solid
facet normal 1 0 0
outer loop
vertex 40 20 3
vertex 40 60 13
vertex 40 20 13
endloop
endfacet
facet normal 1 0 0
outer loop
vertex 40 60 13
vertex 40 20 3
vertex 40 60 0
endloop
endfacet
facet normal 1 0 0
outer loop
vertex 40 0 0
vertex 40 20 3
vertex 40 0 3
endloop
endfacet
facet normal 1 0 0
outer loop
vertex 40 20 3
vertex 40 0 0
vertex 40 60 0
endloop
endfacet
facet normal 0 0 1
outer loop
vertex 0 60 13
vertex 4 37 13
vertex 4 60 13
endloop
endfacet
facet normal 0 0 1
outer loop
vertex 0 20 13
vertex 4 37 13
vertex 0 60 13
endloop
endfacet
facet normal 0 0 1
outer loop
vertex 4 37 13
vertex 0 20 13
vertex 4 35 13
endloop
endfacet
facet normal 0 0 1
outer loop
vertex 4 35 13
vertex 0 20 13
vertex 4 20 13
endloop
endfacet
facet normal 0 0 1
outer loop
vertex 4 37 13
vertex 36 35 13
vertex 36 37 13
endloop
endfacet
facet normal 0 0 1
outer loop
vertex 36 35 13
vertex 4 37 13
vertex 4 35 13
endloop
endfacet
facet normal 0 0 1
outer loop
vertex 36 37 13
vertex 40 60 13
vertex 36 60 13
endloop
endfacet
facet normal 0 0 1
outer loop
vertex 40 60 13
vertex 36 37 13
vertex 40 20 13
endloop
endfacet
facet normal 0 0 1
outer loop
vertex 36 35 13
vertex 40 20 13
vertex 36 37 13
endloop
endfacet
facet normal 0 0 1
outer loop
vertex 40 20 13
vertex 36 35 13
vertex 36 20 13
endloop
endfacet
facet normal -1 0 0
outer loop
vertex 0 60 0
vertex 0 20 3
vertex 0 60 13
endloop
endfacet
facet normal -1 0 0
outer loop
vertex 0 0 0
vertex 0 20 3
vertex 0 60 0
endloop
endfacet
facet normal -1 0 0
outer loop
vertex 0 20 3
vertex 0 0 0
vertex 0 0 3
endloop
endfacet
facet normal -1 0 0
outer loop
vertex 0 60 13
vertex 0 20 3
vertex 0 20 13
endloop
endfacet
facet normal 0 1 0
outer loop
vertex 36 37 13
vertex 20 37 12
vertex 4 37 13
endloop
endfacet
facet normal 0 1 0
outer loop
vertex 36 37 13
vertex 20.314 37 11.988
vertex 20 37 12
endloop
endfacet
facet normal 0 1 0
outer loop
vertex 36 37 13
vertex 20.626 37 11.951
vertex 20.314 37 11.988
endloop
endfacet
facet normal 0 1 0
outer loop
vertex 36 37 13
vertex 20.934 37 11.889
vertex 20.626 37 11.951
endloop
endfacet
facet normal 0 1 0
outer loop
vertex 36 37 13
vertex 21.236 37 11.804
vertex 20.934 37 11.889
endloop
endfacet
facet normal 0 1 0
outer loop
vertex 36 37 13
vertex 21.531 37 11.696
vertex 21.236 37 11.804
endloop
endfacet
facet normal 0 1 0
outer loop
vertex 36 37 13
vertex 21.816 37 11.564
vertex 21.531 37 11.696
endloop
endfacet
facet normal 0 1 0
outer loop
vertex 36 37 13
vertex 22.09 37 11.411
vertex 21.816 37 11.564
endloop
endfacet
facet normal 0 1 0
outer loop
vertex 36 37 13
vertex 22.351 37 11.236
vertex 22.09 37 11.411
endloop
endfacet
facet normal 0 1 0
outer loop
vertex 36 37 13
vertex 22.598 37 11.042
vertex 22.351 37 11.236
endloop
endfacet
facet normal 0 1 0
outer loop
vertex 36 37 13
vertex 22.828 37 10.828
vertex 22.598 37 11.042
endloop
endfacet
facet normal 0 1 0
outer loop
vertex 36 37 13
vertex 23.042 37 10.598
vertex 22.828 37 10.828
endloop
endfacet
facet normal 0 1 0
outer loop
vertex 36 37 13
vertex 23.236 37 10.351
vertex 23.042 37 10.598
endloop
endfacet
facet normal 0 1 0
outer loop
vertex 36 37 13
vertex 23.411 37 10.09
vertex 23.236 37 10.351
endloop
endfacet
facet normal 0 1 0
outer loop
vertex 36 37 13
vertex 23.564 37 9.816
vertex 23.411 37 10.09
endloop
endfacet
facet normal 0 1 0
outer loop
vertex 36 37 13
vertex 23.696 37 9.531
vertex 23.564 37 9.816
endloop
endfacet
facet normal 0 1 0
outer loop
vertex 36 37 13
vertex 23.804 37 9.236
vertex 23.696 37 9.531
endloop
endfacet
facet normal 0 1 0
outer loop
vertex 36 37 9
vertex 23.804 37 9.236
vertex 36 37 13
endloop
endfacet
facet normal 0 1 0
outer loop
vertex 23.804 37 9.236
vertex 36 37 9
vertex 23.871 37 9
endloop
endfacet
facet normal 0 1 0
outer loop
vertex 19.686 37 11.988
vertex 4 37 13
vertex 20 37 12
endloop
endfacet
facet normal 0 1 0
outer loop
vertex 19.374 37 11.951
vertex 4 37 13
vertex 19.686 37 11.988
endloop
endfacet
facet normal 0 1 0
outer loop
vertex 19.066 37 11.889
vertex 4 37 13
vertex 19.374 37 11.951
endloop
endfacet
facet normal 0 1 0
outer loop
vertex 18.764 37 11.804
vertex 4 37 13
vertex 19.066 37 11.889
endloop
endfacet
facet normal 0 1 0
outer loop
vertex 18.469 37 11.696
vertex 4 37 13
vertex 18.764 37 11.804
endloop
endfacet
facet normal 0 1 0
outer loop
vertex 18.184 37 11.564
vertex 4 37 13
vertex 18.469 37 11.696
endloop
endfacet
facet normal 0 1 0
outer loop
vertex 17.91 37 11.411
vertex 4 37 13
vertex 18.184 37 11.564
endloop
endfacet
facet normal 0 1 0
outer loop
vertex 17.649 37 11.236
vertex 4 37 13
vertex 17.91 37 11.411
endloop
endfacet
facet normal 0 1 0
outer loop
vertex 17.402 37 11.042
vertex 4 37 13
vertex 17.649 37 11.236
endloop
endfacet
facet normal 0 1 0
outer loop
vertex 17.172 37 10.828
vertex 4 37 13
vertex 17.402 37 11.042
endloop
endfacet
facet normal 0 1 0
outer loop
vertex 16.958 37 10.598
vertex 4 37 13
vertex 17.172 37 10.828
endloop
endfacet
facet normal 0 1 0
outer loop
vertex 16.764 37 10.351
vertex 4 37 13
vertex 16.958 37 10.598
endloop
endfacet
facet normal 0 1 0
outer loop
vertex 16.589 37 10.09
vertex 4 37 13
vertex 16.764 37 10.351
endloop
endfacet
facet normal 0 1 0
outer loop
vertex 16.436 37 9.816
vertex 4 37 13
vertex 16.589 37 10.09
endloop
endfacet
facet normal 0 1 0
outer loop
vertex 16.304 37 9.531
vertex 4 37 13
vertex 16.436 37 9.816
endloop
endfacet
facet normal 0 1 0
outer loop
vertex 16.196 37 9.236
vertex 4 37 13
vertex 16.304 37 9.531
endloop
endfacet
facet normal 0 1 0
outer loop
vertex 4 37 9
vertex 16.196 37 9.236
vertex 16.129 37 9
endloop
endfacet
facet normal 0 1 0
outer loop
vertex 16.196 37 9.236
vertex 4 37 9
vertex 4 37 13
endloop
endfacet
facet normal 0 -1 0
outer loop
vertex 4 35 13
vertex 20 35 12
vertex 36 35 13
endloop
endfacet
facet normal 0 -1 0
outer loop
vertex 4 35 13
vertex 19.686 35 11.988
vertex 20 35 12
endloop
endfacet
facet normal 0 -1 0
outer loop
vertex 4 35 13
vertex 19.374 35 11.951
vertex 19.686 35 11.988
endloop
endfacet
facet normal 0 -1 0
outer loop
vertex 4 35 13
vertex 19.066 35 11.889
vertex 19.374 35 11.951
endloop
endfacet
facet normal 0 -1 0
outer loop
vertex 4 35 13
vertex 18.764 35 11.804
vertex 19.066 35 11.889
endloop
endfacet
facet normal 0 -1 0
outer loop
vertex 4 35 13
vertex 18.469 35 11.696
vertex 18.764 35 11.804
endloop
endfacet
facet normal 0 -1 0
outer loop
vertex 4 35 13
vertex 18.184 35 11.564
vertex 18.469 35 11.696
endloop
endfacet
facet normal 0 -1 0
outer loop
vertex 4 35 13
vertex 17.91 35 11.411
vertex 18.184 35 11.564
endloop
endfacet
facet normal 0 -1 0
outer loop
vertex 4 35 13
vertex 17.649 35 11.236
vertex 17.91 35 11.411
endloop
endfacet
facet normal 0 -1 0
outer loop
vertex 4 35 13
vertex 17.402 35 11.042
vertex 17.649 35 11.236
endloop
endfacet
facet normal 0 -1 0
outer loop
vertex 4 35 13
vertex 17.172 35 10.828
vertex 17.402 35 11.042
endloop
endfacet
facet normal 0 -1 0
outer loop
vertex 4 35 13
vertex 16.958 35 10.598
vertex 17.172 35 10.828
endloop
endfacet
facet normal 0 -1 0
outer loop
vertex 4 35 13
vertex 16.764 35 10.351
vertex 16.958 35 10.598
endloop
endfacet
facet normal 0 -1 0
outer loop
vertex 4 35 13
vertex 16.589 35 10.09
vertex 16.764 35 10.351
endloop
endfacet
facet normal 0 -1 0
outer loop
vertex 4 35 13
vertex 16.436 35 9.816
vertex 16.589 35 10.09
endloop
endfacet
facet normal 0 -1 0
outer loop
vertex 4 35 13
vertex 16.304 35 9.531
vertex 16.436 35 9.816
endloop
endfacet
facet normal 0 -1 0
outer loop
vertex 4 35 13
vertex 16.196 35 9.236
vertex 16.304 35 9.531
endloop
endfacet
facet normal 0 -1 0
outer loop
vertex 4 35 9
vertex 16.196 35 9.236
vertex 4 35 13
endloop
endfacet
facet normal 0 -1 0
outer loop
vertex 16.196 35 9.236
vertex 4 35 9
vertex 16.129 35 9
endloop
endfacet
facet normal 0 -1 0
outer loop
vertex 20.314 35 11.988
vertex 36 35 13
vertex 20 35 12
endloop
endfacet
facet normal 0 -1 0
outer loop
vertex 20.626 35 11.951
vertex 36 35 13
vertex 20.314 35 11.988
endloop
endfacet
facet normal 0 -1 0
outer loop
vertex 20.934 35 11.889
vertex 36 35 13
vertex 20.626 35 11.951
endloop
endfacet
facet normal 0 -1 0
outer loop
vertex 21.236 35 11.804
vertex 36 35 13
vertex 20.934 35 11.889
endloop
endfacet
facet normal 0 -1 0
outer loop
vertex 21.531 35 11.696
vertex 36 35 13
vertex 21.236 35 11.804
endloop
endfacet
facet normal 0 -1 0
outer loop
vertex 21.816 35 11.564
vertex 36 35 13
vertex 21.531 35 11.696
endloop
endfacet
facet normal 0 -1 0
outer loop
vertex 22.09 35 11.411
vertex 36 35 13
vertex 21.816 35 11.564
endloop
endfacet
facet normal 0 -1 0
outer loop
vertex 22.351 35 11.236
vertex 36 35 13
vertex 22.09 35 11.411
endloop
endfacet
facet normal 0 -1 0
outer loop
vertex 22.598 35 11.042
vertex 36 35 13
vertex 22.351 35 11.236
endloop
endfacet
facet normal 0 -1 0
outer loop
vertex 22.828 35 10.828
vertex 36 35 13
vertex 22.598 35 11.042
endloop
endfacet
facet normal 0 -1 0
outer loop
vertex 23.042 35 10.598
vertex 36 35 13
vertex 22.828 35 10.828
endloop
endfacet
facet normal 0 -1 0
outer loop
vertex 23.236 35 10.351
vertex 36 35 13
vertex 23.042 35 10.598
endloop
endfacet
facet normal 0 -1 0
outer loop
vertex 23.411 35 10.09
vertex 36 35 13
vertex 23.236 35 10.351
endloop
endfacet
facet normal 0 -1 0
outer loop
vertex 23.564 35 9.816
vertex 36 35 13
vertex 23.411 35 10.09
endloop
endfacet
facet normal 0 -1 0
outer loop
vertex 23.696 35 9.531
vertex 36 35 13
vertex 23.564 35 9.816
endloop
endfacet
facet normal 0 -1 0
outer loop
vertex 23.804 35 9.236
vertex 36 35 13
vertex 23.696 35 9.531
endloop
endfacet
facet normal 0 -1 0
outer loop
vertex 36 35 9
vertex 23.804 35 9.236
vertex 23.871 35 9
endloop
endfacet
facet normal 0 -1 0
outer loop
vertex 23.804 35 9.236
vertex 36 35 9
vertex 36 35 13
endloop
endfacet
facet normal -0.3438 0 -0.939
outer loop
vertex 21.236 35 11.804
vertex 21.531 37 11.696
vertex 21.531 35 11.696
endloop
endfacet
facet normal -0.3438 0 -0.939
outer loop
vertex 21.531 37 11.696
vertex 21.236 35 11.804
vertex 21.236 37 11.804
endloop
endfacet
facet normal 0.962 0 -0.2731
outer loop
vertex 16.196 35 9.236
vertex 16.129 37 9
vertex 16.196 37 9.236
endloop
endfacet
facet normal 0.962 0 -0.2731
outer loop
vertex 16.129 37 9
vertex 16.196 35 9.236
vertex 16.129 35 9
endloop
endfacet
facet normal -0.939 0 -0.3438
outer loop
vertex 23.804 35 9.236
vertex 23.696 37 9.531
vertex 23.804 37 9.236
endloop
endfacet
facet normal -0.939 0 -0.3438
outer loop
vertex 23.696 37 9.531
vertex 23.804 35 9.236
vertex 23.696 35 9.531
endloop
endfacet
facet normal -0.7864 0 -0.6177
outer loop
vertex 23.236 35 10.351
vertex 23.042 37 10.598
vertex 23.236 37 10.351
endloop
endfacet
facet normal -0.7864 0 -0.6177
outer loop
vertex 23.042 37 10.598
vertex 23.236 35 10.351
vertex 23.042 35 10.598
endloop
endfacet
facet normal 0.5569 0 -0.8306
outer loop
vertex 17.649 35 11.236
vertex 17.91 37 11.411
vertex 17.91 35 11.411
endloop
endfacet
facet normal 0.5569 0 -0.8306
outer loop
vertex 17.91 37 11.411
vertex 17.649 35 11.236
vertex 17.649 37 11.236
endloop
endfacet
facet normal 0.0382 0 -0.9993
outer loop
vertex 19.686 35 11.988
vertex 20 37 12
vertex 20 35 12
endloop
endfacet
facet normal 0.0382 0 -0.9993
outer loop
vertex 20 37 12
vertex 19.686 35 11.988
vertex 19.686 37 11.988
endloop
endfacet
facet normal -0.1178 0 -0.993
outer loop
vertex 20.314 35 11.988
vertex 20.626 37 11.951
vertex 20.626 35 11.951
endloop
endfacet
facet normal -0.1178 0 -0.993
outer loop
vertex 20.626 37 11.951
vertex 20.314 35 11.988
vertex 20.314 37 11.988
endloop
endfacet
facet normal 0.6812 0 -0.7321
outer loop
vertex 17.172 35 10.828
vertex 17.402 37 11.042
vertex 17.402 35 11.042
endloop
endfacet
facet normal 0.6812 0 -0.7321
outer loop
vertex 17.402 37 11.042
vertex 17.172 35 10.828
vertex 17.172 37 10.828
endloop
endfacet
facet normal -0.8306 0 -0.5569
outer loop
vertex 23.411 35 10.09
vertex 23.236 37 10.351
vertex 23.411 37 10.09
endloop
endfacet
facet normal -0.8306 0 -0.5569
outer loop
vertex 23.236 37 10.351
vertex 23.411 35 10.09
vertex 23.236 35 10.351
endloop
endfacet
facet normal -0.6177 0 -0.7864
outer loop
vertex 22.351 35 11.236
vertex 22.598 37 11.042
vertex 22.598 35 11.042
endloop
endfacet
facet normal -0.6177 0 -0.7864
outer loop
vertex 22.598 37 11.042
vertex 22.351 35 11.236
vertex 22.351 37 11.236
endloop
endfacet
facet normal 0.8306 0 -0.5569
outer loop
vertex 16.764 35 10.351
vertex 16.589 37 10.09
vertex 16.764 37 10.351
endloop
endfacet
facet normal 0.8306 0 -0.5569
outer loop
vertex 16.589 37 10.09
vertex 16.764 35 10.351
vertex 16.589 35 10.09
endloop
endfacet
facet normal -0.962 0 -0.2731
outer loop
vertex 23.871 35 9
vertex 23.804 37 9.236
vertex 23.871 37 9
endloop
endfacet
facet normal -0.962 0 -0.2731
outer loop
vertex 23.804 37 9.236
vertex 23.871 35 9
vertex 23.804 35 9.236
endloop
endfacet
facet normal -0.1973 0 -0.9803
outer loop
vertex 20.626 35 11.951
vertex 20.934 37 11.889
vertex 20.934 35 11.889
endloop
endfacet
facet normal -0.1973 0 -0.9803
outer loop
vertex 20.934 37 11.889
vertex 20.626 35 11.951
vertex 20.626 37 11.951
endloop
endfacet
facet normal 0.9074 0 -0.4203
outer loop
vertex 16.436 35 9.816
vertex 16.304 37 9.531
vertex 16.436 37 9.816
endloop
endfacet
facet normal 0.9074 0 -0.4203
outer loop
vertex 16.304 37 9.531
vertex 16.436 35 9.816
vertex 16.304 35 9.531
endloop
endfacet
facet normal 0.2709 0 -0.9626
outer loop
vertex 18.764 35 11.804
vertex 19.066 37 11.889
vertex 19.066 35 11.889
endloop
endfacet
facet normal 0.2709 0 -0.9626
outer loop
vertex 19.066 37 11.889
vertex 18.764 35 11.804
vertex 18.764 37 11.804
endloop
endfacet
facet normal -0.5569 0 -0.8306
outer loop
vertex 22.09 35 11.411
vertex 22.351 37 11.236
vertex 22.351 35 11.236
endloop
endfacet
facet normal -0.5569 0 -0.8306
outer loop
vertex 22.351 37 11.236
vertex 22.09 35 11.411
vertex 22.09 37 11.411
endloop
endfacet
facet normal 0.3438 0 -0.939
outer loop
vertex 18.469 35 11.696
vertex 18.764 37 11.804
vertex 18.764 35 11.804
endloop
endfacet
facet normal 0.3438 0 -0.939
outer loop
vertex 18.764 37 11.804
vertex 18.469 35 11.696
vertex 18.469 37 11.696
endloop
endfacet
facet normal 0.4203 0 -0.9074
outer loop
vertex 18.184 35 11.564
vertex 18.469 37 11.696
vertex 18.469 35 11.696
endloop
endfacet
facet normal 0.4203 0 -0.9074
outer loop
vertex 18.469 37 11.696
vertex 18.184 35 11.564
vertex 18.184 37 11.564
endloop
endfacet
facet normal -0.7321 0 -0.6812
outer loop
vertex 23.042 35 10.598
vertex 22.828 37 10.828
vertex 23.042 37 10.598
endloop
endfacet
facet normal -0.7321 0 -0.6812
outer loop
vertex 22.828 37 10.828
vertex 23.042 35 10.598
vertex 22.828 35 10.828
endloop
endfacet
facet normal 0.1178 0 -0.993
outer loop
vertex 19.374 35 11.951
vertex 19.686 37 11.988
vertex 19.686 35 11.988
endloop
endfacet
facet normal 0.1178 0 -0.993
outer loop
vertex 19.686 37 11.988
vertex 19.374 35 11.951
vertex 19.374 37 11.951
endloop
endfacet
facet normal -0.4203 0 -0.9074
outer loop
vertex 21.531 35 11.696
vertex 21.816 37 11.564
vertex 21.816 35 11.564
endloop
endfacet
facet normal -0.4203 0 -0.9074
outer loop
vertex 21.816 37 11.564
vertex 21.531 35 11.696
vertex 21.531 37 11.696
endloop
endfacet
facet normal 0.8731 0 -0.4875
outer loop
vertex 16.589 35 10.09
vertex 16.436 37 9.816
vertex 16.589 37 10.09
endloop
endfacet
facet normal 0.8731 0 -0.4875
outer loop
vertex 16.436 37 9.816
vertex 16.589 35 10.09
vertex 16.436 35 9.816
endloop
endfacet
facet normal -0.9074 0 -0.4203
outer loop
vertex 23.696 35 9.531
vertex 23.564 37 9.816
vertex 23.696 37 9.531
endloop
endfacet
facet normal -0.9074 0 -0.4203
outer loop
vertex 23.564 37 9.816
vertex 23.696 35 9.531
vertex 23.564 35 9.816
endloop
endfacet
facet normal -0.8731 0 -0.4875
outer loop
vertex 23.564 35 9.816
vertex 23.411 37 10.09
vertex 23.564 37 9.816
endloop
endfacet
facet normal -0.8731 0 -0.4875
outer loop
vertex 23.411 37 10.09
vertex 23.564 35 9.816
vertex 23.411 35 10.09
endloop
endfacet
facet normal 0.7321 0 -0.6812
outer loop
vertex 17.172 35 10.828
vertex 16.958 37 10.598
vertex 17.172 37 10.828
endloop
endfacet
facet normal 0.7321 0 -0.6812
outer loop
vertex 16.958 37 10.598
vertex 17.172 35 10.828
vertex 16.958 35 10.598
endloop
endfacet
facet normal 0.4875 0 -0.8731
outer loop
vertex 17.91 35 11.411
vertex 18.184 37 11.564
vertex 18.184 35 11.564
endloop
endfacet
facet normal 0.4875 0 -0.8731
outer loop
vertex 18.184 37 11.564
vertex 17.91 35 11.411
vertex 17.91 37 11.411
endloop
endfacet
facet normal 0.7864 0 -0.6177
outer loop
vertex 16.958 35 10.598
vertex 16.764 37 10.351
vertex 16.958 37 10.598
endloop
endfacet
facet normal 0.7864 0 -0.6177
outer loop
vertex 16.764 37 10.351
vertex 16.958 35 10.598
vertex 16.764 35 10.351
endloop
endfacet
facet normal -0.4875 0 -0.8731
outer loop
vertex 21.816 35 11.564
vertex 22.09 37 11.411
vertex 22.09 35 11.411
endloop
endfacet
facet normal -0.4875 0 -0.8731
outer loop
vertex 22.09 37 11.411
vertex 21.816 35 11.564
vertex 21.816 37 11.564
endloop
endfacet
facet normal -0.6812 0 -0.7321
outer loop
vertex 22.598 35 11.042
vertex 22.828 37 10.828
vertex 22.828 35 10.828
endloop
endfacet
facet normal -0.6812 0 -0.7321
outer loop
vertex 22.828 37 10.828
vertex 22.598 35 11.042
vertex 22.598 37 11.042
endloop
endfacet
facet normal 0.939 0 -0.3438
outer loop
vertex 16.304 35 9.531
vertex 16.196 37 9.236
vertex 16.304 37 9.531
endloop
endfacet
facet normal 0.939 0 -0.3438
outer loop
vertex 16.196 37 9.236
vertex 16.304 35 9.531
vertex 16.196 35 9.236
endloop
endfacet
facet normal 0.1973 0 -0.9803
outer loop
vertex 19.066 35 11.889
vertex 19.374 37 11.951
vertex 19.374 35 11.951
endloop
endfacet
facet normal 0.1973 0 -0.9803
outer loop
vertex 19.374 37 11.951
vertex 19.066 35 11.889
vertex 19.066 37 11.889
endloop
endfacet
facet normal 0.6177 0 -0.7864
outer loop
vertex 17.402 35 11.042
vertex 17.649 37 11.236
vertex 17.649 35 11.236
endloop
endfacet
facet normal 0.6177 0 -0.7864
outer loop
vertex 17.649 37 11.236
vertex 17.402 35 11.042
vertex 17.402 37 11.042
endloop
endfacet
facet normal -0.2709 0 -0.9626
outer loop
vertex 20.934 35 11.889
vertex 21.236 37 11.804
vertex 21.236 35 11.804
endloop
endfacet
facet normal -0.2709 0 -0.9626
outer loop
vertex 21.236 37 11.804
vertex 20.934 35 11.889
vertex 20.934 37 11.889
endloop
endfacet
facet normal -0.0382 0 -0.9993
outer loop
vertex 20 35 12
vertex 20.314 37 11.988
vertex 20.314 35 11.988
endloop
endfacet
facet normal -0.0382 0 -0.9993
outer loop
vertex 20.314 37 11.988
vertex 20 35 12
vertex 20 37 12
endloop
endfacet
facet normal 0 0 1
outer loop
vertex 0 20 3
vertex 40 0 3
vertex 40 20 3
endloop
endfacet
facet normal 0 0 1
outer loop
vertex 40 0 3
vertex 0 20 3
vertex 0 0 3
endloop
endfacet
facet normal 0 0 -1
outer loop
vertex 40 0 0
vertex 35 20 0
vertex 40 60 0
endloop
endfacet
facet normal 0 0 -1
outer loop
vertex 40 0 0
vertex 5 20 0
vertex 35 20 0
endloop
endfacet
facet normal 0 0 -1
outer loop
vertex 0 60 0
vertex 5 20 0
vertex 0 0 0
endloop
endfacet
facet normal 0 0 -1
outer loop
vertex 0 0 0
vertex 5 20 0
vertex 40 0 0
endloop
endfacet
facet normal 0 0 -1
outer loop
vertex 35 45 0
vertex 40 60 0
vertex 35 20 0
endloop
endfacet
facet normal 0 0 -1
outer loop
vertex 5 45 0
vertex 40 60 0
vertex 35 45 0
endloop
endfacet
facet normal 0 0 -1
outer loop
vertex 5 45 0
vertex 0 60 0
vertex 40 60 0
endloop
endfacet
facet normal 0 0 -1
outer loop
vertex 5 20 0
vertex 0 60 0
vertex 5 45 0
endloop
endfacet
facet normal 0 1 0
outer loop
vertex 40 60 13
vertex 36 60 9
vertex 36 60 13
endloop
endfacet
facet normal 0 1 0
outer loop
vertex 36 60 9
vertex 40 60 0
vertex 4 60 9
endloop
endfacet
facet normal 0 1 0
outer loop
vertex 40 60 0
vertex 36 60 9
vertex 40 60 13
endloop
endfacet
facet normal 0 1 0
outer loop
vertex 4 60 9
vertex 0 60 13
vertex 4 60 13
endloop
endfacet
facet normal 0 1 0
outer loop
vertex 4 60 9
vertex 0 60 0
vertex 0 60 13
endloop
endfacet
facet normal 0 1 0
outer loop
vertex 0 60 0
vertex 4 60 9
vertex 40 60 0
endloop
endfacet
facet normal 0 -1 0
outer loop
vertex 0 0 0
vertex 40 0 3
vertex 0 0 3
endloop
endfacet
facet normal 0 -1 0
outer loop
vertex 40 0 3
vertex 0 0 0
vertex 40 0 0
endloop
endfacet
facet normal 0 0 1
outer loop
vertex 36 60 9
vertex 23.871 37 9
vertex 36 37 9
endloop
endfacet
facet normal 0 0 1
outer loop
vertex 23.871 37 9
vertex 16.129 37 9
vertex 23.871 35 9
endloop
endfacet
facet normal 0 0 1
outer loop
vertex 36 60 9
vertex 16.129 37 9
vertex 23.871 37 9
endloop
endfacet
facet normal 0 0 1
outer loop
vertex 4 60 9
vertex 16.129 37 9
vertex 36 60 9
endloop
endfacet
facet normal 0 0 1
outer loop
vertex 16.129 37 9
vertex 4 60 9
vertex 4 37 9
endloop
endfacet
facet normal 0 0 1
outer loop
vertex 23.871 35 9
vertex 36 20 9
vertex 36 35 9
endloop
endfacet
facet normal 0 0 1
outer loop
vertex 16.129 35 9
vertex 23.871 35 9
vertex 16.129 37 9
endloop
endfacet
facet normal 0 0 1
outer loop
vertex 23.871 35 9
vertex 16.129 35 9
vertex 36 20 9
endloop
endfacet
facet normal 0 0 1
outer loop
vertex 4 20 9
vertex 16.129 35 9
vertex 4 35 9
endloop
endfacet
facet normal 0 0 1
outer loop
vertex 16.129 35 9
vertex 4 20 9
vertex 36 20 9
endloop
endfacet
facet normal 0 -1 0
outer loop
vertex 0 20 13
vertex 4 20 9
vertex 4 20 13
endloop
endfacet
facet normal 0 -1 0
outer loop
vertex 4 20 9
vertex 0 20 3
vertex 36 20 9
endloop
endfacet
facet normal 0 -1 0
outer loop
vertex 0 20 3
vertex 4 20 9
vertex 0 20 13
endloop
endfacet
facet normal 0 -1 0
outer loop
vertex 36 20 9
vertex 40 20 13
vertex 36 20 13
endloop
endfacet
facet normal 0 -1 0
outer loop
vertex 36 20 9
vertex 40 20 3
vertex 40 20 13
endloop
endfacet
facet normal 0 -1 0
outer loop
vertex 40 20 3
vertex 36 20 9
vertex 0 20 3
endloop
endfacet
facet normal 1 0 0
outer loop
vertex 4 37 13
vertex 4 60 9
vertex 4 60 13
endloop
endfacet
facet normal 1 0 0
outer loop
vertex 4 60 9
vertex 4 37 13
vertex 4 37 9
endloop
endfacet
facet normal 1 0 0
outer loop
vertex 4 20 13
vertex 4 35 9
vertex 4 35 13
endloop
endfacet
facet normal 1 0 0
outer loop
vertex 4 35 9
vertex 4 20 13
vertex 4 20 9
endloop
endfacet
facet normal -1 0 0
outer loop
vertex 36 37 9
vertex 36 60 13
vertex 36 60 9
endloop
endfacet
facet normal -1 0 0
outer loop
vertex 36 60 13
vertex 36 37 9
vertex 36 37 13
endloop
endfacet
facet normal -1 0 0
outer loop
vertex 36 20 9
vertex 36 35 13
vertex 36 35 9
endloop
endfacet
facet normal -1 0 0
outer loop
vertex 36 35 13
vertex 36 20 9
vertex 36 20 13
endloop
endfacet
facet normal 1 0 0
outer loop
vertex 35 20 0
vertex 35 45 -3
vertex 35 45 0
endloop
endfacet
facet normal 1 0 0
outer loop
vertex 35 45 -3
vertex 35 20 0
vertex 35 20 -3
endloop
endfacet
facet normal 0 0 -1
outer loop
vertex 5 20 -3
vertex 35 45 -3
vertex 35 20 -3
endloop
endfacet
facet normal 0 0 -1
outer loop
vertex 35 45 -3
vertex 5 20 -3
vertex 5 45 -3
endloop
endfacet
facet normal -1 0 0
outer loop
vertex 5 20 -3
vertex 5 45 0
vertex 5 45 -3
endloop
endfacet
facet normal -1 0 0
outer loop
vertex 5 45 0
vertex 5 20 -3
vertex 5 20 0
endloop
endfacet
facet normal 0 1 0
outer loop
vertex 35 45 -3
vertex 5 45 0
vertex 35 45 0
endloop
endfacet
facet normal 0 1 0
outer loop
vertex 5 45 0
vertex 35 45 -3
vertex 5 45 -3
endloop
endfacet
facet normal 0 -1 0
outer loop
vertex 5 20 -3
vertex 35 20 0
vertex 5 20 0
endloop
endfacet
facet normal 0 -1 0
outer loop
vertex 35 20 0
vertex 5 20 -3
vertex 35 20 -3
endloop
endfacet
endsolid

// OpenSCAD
// ============================================================
// Parametric stepped platform with side rails, cross wall, and
// bottom relief — all features are additive solids
// ============================================================

// --- Base slab ---
base_length      = 60;   // front-to-back (Y)
base_width       = 40;   // left-to-right (X)
base_thickness   = 3;    // thin slab height (Z)

// --- Raised rear section ---
front_exposed    = 20;   // length of bare front strip left exposed
raised_height    = 6;    // height of raised section above base top

// --- Narrow side strips flanking the raised section ---
side_strip_w     = 4;    // width of each side strip (X)
side_strip_extra = 4;    // additional height above raised section top

// --- Thin transverse wall with real internal opening ---
wall_thick      = 2;     // wall thickness in Y (very thin)
wall_y_pos      = 35;    // Y position measured from front edge
opening_d       = 8;     // through-opening diameter

// --- Bottom step (makes underside non-flat) ---
step_depth      = 3;     // extension below base bottom surface
step_length     = 25;    // Y extent of the lower step
step_width      = 30;    // X extent of the lower step

$fn = 80;

// ============================================================
// Derived helpers
// ============================================================
raised_len  = base_length - front_exposed;  // rear raised section length
total_rail  = raised_height + side_strip_extra;  // total rail height above base
wall_height = total_rail;                    // cross wall reaches same top level

// ============================================================
// Assembly — every feature is added as solid material
// ============================================================
union() {

    // 1. Thin rectangular base slab
    cube([base_width, base_length, base_thickness]);

    // 2. Larger raised rectangular portion at the rear
    translate([0, front_exposed, base_thickness])
        cube([base_width, raised_len, raised_height]);

    // 3. Left narrow raised strip along the raised area
    translate([0, front_exposed, base_thickness + raised_height])
        cube([side_strip_w, raised_len, side_strip_extra]);

    // 4. Right narrow raised strip along the raised area
    translate([base_width - side_strip_w, front_exposed, base_thickness + raised_height])
        cube([side_strip_w, raised_len, side_strip_extra]);

    // 5. Thin transverse wall with a real internal through-opening
    difference() {
        translate([0, wall_y_pos, base_thickness])
            cube([base_width, wall_thick, wall_height]);
        // Through-opening piercing the thin wall (Y direction)
        translate([base_width / 2,
                   wall_y_pos + wall_thick / 2,
                   base_thickness + wall_height / 2])
            rotate([90, 0, 0])
                cylinder(d = opening_d,
                         h = wall_thick + 1,   // overshoot guarantees clean cut
                         center = true);
    }

    // 6. Bottom step — aligned continuation reaching below the base,
    //    so the underside is not a single flat level
    translate([(base_width - step_width) / 2,
               front_exposed,
               -step_depth])
        cube([step_width, step_length, step_depth]);
}
